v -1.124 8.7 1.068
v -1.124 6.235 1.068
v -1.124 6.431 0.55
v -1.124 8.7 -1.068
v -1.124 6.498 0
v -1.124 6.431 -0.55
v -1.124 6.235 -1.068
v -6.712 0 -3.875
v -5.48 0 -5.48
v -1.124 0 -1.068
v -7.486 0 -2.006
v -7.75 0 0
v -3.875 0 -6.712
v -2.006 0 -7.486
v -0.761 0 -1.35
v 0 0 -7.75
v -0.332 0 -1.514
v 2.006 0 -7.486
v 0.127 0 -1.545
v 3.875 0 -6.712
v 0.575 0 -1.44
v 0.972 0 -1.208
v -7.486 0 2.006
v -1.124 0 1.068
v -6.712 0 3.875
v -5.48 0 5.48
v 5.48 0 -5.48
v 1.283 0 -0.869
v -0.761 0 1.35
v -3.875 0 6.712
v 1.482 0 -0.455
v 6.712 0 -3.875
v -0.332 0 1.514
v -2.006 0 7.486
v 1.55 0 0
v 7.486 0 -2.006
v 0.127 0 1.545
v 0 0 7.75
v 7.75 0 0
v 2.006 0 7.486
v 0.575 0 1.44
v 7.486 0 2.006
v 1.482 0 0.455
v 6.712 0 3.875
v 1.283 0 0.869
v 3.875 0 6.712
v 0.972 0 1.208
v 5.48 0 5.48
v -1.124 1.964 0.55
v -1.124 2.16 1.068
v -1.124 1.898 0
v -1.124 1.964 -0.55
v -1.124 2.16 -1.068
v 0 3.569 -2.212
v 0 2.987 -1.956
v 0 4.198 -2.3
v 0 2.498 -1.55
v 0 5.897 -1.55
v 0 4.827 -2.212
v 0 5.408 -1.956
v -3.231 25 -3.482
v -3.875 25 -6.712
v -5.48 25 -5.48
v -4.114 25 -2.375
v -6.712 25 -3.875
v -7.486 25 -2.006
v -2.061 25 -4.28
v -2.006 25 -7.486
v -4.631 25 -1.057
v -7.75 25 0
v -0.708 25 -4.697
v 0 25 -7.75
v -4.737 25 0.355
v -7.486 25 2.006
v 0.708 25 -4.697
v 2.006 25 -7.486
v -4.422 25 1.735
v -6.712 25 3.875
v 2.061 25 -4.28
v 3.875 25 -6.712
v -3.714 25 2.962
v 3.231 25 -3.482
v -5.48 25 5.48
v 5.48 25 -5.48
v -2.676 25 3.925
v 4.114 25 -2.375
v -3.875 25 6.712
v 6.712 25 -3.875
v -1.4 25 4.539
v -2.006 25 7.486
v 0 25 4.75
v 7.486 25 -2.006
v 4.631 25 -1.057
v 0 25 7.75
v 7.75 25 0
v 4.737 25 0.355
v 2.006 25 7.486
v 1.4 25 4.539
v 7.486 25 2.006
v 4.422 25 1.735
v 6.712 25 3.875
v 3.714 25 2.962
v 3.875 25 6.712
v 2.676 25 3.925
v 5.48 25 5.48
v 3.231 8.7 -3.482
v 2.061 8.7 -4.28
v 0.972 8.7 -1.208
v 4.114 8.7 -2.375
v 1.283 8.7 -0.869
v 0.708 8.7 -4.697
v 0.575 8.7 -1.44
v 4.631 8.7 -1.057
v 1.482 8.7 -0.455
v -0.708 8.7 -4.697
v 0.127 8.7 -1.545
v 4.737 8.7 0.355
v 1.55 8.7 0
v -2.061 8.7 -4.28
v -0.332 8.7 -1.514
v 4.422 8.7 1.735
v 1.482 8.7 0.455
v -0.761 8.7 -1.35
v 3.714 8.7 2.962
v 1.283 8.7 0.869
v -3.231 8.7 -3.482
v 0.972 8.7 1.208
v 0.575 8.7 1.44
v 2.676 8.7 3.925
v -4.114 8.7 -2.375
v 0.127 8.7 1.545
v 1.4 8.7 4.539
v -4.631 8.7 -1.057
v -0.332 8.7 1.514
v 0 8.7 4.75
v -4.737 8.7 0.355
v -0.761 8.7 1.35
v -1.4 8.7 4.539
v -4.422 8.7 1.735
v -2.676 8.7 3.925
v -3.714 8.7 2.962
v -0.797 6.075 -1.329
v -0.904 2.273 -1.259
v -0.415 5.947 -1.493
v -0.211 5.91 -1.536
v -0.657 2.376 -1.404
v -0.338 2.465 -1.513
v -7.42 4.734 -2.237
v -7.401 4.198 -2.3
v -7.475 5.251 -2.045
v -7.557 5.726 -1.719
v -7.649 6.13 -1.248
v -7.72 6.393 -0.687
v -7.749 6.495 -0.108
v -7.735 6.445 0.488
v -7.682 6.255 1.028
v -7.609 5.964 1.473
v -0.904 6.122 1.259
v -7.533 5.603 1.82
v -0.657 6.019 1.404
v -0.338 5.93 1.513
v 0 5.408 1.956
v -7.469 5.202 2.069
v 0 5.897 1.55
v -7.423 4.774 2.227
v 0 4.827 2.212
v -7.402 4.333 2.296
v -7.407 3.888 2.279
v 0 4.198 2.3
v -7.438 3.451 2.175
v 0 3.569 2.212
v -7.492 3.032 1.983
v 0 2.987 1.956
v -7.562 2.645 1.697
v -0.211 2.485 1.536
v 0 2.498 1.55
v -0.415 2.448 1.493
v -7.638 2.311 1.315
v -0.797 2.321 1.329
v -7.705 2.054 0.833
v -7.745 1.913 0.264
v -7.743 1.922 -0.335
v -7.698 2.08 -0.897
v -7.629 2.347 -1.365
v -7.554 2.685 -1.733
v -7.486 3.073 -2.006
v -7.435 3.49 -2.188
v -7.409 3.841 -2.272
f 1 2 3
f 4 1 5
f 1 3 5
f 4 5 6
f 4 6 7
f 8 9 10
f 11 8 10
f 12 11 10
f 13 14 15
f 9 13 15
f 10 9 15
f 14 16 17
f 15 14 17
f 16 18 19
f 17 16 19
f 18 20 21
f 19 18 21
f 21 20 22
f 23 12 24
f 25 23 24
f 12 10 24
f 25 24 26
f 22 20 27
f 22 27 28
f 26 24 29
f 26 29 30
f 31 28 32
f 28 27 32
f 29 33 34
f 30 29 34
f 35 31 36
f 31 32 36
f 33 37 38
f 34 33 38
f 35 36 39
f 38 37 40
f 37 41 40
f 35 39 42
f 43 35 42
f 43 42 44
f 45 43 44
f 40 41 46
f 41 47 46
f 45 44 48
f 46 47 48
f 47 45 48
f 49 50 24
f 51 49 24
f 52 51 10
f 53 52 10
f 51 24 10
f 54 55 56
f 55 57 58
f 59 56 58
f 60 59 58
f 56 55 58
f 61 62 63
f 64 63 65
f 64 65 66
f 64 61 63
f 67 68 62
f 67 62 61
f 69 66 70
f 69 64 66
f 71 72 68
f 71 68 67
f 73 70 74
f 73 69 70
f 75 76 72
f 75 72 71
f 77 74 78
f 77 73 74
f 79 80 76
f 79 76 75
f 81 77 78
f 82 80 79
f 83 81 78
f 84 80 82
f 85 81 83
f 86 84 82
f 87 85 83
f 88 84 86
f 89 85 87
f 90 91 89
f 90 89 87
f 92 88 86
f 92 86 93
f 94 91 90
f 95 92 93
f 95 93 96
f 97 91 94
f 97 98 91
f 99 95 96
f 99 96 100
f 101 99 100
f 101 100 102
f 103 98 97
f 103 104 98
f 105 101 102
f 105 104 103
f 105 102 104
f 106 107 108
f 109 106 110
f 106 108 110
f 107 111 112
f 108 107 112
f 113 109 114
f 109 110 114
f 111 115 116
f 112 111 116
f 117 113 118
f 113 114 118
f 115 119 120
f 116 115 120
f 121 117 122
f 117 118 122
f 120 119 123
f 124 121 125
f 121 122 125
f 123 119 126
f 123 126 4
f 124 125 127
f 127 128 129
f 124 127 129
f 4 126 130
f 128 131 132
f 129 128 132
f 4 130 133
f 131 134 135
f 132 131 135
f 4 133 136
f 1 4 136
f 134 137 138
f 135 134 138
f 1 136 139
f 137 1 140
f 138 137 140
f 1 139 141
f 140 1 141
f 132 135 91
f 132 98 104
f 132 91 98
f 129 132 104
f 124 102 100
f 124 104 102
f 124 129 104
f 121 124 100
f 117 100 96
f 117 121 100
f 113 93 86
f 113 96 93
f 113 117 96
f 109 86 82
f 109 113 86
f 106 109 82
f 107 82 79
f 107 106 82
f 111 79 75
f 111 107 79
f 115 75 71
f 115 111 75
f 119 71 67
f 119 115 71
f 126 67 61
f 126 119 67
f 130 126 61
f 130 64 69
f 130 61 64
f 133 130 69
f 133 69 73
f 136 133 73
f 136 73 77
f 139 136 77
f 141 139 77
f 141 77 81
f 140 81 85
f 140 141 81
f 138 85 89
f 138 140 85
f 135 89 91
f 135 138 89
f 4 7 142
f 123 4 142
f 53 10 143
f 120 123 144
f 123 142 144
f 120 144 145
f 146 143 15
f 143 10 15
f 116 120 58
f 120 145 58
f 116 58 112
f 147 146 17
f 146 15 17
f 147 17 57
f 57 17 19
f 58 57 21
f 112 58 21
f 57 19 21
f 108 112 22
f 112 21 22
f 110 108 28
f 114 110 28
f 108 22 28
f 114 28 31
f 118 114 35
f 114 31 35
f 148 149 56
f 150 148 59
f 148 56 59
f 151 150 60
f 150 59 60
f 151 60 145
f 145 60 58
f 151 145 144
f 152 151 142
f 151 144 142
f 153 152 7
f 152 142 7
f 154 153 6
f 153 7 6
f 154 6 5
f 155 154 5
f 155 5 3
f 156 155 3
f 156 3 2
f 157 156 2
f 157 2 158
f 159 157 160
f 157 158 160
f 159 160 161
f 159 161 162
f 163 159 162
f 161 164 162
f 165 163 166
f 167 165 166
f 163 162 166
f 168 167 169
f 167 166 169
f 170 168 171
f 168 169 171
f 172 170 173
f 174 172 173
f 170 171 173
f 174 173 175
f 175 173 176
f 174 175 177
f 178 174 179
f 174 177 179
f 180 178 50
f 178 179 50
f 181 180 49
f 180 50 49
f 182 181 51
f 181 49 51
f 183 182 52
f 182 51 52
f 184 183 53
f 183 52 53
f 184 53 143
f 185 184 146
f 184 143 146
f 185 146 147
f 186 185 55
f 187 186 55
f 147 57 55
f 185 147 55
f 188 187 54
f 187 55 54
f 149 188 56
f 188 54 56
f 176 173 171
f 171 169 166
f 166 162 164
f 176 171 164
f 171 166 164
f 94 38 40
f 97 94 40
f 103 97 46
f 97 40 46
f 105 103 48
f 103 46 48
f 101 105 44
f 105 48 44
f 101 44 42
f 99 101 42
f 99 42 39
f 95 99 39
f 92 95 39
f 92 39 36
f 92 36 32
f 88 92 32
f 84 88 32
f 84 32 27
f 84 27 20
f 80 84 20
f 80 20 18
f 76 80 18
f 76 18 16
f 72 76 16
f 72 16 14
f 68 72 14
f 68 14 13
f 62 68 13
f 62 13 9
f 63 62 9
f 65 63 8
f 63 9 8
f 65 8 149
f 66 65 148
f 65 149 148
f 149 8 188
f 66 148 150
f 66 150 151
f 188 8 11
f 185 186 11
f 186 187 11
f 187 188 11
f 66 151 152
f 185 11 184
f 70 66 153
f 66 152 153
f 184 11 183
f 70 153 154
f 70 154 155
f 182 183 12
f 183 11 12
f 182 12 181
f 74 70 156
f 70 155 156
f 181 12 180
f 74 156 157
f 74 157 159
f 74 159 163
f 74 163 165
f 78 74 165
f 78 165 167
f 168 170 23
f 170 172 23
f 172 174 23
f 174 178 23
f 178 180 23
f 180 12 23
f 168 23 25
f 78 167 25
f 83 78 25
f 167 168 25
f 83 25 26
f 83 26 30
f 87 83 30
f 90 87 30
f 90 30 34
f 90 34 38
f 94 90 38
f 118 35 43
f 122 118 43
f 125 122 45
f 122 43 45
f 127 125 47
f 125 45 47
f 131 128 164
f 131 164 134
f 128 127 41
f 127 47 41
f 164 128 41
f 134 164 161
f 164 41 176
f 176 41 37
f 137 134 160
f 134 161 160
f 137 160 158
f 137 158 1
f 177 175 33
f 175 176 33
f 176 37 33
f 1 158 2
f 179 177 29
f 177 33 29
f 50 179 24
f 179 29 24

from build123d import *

# Parameters (mm, degrees)
CROQUIS1_R              = 7.75
SALIENTE_EXTRUIR1_DEPTH = 25
VACIADO1_T              = -3
CROQUIS4_R              = 7.75
SALIENTE_EXTRUIR2_DEPTH = 8.7
CORTAR_EXTRUIR1_DEPTH   = 36.6
CROQUIS2_R              = 2.3
CORTAR_EXTRUIR2_DEPTH   = 8.5


with BuildPart() as part:
    # Croquis1 → Saliente-Extruir1 (new body)
    with BuildSketch(Plane(origin=(0, 0, 0), x_dir=(1, 0, 0), z_dir=(0, 1, 0))):
        with Locations(Location((0, 0, 0), (0, 0, 270))):
            Circle(CROQUIS1_R)
    extrude(amount=SALIENTE_EXTRUIR1_DEPTH)

    # Vaciado1
    vaciado1_openings = [part.faces().sort_by_distance(p)[0] for p in [
        (0, 25, 0),
    ]]
    offset(amount=VACIADO1_T, openings=vaciado1_openings, kind=Kind.INTERSECTION)

    # Croquis4 → Saliente-Extruir2 (add)
    with BuildSketch(Plane.XZ):
        with Locations(Location((0, 0, 0), (0, 0, 90))):
            Circle(CROQUIS4_R)
    extrude(amount=-SALIENTE_EXTRUIR2_DEPTH)

    # Croquis3 → Cortar-Extruir1 (cut)
    with BuildSketch(Plane.XZ):
        with BuildLine():
            ThreePointArc((1.55, 0), (0.574750216, 1.439500674), (-1.123757664, 1.067552674))
            Line((-1.123757664, 1.067552674), (-1.123757664, -1.067552674))
            ThreePointArc((-1.123757664, -1.067552674), (0.574750216, -1.439500674), (1.55, 0))
        make_face()
    extrude(amount=-CORTAR_EXTRUIR1_DEPTH, mode=Mode.SUBTRACT)

    # Croquis2 → Cortar-Extruir2 (cut)
    with BuildSketch(Plane(origin=(0, 0, 0), x_dir=(0, 0, -1), z_dir=(1, 0, 0))):
        with Locations((0, 4.19773403)):
            Circle(CROQUIS2_R)
    extrude(amount=-CORTAR_EXTRUIR2_DEPTH, mode=Mode.SUBTRACT)


solid = part.part
